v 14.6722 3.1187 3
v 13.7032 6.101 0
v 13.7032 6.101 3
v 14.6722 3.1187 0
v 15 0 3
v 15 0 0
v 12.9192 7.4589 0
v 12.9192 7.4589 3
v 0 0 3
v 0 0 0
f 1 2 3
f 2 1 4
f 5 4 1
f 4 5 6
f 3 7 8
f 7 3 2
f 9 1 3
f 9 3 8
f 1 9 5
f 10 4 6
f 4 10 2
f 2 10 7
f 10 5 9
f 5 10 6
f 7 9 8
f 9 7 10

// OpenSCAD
toleranta = 1;

module felie_pizza_difference( diametru, grosime, unghi_felie)

{
 difference() {   
cylinder ( h=grosime, r= diametru/2);
   translate([-diametru/2 - toleranta, -diametru/2 -toleranta, -toleranta]) 
     cube([diametru+2*toleranta, diametru/2+toleranta, grosime+2*toleranta]);
         rotate([0, 0, unghi_felie]) translate([-diametru/2-toleranta, 0, -toleranta])cube([diametru+2*toleranta, diametru/2+toleranta, grosime+2*toleranta]);
 }
    }
  
  felie_pizza_difference( diametru=30, grosime=3, unghi_felie=30);
